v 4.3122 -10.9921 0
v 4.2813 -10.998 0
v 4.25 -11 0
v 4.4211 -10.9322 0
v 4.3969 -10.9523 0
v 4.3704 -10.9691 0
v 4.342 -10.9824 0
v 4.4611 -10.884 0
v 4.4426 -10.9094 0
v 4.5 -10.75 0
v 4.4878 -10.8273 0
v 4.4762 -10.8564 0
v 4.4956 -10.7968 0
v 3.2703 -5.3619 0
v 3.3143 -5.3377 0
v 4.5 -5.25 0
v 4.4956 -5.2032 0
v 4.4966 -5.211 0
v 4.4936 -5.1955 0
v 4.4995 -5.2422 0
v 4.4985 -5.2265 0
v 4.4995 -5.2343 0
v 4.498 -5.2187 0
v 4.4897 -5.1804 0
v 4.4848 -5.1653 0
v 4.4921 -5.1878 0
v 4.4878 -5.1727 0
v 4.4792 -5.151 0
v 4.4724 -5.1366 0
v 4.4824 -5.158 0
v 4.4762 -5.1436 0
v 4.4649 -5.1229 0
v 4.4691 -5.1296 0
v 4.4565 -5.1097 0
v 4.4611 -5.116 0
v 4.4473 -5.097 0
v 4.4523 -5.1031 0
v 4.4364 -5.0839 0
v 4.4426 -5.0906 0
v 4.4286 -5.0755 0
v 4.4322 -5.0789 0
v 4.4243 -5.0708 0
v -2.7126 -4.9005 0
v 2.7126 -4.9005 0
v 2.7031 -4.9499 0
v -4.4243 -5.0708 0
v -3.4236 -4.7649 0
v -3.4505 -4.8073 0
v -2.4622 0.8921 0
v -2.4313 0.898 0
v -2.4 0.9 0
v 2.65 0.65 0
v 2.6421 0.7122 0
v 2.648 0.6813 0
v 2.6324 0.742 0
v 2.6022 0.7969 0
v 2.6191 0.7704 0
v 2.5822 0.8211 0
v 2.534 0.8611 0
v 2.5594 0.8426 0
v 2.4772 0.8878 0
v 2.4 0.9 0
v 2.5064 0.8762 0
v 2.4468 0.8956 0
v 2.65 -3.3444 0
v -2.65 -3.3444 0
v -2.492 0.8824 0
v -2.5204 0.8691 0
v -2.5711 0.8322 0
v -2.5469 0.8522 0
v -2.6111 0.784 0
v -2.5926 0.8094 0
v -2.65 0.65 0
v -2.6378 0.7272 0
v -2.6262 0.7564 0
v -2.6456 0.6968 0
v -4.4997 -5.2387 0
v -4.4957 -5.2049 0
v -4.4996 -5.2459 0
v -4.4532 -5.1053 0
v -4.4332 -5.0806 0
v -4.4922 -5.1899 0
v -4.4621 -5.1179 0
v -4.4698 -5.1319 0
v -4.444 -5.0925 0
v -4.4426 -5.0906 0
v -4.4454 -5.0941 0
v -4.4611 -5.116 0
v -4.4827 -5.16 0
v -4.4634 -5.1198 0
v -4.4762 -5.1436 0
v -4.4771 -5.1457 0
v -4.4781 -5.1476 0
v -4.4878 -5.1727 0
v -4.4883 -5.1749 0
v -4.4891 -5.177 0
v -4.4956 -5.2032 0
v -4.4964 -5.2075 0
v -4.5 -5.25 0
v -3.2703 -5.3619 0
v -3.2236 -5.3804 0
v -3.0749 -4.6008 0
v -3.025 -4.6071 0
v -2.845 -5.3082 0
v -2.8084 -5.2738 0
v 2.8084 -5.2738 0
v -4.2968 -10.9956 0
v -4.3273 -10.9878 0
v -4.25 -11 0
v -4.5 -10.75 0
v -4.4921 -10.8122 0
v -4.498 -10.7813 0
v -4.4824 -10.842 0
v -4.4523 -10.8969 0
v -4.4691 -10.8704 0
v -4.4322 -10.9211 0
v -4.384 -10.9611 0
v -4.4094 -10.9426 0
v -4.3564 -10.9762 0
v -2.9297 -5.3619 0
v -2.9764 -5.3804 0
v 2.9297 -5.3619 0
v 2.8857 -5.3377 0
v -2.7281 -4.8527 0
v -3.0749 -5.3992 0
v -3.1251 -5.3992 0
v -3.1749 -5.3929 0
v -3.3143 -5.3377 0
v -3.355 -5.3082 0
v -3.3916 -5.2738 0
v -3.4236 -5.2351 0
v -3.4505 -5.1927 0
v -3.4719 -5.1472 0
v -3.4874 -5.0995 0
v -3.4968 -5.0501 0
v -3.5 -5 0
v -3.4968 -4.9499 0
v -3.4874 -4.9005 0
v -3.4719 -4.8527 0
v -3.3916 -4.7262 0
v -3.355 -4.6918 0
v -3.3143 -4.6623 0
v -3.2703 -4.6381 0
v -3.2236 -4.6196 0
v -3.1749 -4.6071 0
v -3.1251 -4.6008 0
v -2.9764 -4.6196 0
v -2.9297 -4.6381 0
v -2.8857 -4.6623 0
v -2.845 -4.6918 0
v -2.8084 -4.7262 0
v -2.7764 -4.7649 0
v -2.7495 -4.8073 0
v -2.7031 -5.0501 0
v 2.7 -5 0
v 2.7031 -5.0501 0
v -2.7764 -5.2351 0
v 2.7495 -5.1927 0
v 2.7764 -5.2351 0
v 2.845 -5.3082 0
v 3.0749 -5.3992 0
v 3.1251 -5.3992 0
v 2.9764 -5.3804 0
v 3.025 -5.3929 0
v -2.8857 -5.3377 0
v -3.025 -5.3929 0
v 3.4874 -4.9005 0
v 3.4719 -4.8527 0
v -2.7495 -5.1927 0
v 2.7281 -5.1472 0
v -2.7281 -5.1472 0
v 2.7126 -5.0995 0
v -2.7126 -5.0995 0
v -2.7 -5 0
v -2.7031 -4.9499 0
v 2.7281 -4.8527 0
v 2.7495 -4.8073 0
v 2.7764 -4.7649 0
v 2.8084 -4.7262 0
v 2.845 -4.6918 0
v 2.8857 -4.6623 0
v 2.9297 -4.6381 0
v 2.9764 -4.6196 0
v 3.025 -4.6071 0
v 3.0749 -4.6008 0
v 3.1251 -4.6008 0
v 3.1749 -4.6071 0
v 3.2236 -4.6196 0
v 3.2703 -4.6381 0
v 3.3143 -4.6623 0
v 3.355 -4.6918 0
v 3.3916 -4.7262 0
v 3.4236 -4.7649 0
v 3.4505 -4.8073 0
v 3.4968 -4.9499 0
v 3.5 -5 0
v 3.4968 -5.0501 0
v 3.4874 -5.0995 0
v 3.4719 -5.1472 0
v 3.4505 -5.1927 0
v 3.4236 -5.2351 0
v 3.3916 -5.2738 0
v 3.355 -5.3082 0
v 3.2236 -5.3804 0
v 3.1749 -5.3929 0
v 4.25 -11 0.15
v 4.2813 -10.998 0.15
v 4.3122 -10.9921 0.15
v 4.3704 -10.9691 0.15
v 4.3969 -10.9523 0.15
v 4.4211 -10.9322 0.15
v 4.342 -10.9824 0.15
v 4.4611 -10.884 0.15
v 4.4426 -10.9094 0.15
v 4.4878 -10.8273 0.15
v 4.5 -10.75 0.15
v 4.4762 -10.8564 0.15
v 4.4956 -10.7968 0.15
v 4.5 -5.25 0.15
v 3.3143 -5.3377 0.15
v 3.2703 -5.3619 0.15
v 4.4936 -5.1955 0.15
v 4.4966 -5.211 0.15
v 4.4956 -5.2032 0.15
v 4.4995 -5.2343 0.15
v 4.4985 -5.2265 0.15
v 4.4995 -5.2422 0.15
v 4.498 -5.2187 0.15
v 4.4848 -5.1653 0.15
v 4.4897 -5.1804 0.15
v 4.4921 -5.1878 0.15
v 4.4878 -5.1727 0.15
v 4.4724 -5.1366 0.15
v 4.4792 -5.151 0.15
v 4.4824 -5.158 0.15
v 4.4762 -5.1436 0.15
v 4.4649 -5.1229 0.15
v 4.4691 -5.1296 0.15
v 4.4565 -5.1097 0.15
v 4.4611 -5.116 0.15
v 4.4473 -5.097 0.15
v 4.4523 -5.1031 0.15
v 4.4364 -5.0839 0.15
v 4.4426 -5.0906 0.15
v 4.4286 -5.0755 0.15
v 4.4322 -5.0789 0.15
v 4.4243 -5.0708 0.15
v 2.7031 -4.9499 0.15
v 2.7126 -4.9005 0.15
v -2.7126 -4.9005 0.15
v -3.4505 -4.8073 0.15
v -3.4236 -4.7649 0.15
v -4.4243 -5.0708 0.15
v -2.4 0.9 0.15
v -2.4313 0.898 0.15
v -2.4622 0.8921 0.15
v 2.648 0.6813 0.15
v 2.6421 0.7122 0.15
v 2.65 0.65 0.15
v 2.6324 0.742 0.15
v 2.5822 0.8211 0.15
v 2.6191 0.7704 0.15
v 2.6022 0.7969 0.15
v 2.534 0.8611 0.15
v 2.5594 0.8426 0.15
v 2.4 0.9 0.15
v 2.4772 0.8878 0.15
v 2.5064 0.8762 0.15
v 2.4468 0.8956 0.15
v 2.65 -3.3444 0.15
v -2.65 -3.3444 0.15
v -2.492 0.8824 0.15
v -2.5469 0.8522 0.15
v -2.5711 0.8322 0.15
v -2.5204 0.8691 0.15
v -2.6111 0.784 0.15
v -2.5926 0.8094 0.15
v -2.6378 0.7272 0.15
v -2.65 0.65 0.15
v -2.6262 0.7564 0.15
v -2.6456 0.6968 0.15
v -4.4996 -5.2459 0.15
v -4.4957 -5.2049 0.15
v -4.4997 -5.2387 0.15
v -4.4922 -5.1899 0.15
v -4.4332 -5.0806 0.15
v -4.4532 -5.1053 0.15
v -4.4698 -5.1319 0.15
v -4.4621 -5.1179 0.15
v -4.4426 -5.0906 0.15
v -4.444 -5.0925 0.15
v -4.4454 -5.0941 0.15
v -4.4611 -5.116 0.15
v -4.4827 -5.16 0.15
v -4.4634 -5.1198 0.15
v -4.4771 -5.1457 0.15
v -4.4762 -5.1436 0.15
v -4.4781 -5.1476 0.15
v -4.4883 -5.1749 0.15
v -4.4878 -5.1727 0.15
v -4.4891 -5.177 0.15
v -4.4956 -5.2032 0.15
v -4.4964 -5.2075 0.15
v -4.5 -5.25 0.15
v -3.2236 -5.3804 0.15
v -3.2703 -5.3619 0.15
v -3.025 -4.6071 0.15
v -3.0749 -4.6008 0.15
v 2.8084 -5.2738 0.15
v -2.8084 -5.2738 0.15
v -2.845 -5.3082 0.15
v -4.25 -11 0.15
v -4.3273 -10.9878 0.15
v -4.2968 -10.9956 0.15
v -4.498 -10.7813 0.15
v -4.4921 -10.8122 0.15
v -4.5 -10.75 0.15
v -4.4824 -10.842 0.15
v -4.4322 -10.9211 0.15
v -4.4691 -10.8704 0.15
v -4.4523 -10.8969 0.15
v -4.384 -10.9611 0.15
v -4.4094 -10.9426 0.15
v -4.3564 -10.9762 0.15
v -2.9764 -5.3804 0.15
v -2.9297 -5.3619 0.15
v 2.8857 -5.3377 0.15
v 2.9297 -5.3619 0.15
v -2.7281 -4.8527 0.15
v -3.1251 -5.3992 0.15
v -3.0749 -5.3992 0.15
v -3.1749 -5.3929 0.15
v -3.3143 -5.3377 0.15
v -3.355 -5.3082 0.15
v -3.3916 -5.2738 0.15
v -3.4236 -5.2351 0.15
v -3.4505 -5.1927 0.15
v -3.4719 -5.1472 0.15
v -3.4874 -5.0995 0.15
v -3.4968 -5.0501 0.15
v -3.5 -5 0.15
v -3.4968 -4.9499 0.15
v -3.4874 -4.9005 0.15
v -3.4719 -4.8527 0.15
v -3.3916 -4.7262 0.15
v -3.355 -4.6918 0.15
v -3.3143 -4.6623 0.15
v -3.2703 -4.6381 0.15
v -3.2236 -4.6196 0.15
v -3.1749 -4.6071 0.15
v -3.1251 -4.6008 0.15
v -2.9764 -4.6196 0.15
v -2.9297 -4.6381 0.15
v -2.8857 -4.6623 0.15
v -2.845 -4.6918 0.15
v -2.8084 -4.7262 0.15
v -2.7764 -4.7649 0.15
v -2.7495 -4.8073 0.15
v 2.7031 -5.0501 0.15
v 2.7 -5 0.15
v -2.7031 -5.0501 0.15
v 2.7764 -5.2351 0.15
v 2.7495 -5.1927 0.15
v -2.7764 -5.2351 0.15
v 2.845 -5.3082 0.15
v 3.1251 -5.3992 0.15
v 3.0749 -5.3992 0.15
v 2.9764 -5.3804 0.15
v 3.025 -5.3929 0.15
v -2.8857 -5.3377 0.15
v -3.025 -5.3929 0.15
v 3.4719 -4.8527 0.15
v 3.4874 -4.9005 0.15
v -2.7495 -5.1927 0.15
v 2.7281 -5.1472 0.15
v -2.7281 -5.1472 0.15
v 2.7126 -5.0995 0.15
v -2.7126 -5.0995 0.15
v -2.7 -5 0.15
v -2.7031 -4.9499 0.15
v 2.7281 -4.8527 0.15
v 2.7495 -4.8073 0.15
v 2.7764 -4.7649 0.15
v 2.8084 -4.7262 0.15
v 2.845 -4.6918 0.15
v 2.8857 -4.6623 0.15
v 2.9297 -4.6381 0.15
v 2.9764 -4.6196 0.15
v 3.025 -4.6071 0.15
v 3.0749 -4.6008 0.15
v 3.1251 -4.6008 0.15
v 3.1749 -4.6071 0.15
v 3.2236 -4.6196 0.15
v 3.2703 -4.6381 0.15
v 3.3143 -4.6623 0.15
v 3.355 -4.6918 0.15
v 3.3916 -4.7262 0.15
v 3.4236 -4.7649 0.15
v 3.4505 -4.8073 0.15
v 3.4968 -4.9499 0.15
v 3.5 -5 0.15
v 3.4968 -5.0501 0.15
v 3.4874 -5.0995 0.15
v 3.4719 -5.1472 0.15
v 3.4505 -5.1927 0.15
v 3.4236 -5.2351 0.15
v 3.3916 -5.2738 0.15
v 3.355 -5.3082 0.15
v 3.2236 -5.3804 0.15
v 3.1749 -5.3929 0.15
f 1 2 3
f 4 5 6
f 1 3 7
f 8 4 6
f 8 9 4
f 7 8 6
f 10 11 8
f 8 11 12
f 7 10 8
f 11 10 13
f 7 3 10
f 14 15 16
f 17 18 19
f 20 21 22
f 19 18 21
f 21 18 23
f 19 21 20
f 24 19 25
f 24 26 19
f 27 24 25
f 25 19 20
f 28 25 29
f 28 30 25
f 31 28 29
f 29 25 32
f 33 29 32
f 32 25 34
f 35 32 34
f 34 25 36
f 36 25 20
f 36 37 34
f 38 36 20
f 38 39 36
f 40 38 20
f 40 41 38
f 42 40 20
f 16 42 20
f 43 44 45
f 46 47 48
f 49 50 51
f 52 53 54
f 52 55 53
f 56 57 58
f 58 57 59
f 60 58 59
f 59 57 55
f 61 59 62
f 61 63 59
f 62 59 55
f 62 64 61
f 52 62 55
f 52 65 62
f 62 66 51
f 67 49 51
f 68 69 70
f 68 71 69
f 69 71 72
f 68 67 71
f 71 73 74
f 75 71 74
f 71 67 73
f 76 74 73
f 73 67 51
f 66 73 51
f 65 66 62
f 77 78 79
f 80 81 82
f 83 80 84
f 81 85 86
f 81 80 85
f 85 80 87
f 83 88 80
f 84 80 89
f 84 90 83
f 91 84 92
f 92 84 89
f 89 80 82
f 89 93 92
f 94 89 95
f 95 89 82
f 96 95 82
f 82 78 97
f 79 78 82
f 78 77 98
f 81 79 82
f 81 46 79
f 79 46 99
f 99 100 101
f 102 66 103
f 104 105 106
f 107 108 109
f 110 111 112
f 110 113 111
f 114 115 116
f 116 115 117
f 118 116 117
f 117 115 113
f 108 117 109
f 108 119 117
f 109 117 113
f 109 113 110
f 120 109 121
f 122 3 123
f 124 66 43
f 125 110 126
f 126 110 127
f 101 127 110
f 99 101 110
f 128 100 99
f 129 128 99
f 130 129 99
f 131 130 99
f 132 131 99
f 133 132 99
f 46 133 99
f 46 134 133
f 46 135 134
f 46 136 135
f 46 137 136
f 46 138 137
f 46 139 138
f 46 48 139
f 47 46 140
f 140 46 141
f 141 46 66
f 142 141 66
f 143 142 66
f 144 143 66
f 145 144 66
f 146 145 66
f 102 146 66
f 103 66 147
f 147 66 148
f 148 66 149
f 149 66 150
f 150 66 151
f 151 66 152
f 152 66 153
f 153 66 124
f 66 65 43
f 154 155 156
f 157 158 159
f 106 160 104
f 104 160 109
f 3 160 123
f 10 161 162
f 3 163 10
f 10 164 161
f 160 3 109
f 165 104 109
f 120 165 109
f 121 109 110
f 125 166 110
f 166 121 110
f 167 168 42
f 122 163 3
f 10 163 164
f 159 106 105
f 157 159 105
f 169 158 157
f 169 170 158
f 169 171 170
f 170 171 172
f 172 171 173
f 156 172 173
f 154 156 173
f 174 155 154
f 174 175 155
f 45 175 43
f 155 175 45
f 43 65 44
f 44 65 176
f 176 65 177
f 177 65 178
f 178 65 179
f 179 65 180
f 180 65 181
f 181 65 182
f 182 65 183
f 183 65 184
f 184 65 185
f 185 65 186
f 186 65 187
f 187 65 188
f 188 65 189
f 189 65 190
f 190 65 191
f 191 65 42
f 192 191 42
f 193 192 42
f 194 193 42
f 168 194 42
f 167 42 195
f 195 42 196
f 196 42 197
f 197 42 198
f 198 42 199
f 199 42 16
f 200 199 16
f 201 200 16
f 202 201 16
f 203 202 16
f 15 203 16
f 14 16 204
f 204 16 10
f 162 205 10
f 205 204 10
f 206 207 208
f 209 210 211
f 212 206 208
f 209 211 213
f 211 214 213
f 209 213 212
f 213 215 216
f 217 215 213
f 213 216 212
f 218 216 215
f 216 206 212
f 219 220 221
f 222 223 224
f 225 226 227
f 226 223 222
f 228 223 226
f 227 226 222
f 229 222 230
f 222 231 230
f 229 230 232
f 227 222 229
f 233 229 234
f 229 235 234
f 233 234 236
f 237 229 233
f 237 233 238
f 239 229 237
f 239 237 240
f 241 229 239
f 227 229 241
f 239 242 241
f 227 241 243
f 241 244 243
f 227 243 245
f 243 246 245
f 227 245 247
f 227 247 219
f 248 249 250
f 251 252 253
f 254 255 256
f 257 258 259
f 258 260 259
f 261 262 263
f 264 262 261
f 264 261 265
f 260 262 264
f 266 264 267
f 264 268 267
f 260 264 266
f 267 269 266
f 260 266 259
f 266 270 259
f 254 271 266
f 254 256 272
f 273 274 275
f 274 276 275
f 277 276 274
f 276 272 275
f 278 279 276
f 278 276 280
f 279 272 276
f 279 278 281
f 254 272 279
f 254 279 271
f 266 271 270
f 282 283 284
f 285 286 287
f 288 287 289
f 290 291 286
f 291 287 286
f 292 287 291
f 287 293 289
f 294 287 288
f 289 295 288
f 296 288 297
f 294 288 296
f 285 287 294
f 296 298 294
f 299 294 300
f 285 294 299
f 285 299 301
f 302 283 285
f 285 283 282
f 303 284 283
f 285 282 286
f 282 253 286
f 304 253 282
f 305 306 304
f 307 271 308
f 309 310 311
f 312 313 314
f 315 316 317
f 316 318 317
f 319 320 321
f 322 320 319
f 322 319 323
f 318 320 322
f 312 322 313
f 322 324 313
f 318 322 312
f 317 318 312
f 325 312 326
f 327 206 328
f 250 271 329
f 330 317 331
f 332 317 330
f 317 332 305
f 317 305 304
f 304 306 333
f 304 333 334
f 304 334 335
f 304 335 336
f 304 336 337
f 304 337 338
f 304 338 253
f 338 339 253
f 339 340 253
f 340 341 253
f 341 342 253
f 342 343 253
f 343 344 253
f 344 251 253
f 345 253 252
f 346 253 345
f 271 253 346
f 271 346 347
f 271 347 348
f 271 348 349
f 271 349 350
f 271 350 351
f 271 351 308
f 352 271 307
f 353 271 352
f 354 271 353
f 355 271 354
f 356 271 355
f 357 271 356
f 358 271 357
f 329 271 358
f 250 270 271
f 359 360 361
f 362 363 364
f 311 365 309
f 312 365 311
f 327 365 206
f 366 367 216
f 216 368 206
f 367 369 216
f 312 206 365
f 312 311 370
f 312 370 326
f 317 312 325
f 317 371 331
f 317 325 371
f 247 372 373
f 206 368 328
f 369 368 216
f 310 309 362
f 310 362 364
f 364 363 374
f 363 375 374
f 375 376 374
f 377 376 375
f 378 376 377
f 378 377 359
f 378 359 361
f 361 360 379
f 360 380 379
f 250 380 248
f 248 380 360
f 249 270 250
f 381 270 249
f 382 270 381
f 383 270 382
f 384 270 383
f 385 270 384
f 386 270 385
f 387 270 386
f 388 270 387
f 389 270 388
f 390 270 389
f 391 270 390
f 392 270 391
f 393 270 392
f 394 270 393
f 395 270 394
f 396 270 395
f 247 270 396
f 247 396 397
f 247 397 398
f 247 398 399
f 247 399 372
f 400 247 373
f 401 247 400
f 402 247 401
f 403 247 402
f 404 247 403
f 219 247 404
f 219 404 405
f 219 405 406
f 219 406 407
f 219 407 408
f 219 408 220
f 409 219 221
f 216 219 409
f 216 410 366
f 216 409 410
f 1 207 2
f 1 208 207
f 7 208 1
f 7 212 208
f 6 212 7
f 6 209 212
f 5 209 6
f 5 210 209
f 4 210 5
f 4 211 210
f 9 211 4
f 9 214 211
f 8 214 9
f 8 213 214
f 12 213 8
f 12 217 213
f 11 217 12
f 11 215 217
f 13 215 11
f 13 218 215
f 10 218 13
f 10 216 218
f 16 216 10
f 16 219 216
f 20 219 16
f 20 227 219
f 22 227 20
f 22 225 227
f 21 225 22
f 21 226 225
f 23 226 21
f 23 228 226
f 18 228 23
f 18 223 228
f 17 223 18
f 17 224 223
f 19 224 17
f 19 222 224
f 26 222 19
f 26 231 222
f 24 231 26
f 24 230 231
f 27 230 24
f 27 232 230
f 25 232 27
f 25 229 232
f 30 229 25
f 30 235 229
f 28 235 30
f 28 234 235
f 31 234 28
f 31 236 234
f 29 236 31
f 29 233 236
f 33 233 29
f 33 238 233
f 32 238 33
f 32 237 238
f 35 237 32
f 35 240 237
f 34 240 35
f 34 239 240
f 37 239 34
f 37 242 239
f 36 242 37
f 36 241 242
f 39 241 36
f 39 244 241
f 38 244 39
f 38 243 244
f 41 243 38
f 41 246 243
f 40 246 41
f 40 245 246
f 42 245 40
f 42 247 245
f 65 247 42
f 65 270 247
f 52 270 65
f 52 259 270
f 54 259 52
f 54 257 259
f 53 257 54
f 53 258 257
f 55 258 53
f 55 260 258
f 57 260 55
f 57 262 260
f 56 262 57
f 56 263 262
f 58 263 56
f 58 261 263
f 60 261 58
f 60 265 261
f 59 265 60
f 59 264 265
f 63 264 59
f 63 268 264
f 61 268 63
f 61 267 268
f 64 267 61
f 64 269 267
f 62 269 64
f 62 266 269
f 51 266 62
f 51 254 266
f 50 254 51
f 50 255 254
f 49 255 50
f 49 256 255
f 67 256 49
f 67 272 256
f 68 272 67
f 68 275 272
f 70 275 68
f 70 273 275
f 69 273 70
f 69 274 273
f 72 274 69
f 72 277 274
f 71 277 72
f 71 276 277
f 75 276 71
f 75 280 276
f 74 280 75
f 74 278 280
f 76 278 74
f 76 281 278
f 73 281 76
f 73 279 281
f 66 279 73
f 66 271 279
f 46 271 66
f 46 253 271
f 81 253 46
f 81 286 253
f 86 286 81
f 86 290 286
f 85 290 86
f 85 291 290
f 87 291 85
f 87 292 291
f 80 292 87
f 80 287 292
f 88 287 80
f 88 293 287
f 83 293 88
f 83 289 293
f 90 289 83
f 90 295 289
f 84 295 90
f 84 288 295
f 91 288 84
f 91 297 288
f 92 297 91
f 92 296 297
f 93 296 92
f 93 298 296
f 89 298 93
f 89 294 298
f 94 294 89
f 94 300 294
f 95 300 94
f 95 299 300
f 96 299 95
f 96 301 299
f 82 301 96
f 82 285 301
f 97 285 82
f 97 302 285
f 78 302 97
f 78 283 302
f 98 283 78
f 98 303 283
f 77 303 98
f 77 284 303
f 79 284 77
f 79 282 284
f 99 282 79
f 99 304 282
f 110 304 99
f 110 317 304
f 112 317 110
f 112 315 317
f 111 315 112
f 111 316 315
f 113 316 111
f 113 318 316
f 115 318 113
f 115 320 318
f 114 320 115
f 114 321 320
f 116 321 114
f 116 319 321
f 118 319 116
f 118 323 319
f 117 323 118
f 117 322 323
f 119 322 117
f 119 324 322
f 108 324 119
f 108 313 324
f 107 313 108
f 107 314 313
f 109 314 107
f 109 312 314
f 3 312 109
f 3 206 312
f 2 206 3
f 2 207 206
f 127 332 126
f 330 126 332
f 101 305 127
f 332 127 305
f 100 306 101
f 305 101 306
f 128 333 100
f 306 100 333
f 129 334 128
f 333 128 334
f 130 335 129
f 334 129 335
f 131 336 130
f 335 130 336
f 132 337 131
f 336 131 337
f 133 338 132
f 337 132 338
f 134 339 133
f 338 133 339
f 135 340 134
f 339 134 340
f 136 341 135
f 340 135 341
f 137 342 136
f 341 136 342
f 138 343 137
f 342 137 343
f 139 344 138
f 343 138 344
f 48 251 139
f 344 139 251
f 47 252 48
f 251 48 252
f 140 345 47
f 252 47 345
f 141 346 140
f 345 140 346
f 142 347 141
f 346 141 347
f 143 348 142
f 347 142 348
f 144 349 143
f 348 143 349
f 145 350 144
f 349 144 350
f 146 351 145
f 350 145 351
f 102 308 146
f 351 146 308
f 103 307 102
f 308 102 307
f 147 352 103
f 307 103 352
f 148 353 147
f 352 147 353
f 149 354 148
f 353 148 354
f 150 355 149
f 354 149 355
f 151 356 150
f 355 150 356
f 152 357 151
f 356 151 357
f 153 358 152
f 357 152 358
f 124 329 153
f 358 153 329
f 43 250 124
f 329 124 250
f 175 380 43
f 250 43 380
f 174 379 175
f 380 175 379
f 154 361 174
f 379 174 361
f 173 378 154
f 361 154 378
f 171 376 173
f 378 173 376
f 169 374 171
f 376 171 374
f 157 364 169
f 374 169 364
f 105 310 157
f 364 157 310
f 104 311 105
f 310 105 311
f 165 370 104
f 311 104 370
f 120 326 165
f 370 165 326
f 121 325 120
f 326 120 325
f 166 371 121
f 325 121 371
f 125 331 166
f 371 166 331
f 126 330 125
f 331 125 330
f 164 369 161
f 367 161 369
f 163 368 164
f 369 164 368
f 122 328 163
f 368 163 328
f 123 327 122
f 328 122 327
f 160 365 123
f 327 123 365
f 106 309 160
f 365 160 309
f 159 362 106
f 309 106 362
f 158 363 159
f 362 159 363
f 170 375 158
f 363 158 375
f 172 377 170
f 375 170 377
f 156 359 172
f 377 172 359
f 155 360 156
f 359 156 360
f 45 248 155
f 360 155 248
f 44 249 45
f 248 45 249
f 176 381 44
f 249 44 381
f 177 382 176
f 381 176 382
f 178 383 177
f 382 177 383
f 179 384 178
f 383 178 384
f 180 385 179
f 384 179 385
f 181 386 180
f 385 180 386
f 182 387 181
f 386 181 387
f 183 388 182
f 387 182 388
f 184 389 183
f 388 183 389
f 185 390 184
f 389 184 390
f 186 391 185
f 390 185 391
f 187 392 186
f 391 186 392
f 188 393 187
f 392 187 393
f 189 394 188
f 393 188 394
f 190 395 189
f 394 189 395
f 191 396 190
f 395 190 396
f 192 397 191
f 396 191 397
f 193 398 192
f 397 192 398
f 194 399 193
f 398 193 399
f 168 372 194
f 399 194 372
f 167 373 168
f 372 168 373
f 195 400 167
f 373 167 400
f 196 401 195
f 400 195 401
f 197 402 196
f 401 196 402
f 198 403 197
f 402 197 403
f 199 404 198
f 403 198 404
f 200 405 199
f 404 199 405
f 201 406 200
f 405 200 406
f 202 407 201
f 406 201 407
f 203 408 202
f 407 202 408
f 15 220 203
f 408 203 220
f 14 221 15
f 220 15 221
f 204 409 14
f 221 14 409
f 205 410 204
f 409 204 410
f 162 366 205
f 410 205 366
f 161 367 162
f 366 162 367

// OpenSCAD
$fn=50;
flxRad=0.25; //edge rad of Flex
flxPnlDims=[5.3,0.9]; //Dimensions of Flex on Panel
flxTapDims=[9,6];
flxThck=0.15;
//Length of Flex from panel to tap
flxLen=11;
//holes in the flex
flxHoleDist=6.2;
flxHoleDia=0.8;
//offset from bottom
flxHoleBtmOffset=6;

linear_extrude(flxThck)
 difference(){
    flexContour(); 
    for (ix=[-1,1])
      translate([ix*flxHoleDist/2,flxHoleBtmOffset-flxLen]) circle(d=flxHoleDia);
  }
  
module flexContour(){
     //tap
      translate([0,-flxLen+flxTapDims.y/2]) offset(flxRad) square([flxTapDims.x-flxRad*2,flxTapDims.y-flxRad*2],true);
      //main
      translate([0,-(flxLen-flxPnlDims.y)/2]) offset(flxRad) square([flxPnlDims.x-flxRad*2,flxLen+flxPnlDims.y-flxRad*2],true);
      
      //45° transistion between tap an main flex
      poly=[[-(flxPnlDims.x/2-flxRad),((flxLen+flxPnlDims.y)/2-flxRad)-flxLen+(flxTapDims.x-flxPnlDims.x)/2],
            [(flxPnlDims.x/2-flxRad),((flxLen+flxPnlDims.y)/2-flxRad)-flxLen+(flxTapDims.x-flxPnlDims.x)/2],
            [(flxTapDims.x/2-flxRad),(flxTapDims.y/2-flxRad)-flxLen+flxTapDims.y/2],
            [-(flxTapDims.x/2-flxRad),(flxTapDims.y/2-flxRad)-flxLen+flxTapDims.y/2]
          ];
      offset(flxRad) polygon(poly);
}
